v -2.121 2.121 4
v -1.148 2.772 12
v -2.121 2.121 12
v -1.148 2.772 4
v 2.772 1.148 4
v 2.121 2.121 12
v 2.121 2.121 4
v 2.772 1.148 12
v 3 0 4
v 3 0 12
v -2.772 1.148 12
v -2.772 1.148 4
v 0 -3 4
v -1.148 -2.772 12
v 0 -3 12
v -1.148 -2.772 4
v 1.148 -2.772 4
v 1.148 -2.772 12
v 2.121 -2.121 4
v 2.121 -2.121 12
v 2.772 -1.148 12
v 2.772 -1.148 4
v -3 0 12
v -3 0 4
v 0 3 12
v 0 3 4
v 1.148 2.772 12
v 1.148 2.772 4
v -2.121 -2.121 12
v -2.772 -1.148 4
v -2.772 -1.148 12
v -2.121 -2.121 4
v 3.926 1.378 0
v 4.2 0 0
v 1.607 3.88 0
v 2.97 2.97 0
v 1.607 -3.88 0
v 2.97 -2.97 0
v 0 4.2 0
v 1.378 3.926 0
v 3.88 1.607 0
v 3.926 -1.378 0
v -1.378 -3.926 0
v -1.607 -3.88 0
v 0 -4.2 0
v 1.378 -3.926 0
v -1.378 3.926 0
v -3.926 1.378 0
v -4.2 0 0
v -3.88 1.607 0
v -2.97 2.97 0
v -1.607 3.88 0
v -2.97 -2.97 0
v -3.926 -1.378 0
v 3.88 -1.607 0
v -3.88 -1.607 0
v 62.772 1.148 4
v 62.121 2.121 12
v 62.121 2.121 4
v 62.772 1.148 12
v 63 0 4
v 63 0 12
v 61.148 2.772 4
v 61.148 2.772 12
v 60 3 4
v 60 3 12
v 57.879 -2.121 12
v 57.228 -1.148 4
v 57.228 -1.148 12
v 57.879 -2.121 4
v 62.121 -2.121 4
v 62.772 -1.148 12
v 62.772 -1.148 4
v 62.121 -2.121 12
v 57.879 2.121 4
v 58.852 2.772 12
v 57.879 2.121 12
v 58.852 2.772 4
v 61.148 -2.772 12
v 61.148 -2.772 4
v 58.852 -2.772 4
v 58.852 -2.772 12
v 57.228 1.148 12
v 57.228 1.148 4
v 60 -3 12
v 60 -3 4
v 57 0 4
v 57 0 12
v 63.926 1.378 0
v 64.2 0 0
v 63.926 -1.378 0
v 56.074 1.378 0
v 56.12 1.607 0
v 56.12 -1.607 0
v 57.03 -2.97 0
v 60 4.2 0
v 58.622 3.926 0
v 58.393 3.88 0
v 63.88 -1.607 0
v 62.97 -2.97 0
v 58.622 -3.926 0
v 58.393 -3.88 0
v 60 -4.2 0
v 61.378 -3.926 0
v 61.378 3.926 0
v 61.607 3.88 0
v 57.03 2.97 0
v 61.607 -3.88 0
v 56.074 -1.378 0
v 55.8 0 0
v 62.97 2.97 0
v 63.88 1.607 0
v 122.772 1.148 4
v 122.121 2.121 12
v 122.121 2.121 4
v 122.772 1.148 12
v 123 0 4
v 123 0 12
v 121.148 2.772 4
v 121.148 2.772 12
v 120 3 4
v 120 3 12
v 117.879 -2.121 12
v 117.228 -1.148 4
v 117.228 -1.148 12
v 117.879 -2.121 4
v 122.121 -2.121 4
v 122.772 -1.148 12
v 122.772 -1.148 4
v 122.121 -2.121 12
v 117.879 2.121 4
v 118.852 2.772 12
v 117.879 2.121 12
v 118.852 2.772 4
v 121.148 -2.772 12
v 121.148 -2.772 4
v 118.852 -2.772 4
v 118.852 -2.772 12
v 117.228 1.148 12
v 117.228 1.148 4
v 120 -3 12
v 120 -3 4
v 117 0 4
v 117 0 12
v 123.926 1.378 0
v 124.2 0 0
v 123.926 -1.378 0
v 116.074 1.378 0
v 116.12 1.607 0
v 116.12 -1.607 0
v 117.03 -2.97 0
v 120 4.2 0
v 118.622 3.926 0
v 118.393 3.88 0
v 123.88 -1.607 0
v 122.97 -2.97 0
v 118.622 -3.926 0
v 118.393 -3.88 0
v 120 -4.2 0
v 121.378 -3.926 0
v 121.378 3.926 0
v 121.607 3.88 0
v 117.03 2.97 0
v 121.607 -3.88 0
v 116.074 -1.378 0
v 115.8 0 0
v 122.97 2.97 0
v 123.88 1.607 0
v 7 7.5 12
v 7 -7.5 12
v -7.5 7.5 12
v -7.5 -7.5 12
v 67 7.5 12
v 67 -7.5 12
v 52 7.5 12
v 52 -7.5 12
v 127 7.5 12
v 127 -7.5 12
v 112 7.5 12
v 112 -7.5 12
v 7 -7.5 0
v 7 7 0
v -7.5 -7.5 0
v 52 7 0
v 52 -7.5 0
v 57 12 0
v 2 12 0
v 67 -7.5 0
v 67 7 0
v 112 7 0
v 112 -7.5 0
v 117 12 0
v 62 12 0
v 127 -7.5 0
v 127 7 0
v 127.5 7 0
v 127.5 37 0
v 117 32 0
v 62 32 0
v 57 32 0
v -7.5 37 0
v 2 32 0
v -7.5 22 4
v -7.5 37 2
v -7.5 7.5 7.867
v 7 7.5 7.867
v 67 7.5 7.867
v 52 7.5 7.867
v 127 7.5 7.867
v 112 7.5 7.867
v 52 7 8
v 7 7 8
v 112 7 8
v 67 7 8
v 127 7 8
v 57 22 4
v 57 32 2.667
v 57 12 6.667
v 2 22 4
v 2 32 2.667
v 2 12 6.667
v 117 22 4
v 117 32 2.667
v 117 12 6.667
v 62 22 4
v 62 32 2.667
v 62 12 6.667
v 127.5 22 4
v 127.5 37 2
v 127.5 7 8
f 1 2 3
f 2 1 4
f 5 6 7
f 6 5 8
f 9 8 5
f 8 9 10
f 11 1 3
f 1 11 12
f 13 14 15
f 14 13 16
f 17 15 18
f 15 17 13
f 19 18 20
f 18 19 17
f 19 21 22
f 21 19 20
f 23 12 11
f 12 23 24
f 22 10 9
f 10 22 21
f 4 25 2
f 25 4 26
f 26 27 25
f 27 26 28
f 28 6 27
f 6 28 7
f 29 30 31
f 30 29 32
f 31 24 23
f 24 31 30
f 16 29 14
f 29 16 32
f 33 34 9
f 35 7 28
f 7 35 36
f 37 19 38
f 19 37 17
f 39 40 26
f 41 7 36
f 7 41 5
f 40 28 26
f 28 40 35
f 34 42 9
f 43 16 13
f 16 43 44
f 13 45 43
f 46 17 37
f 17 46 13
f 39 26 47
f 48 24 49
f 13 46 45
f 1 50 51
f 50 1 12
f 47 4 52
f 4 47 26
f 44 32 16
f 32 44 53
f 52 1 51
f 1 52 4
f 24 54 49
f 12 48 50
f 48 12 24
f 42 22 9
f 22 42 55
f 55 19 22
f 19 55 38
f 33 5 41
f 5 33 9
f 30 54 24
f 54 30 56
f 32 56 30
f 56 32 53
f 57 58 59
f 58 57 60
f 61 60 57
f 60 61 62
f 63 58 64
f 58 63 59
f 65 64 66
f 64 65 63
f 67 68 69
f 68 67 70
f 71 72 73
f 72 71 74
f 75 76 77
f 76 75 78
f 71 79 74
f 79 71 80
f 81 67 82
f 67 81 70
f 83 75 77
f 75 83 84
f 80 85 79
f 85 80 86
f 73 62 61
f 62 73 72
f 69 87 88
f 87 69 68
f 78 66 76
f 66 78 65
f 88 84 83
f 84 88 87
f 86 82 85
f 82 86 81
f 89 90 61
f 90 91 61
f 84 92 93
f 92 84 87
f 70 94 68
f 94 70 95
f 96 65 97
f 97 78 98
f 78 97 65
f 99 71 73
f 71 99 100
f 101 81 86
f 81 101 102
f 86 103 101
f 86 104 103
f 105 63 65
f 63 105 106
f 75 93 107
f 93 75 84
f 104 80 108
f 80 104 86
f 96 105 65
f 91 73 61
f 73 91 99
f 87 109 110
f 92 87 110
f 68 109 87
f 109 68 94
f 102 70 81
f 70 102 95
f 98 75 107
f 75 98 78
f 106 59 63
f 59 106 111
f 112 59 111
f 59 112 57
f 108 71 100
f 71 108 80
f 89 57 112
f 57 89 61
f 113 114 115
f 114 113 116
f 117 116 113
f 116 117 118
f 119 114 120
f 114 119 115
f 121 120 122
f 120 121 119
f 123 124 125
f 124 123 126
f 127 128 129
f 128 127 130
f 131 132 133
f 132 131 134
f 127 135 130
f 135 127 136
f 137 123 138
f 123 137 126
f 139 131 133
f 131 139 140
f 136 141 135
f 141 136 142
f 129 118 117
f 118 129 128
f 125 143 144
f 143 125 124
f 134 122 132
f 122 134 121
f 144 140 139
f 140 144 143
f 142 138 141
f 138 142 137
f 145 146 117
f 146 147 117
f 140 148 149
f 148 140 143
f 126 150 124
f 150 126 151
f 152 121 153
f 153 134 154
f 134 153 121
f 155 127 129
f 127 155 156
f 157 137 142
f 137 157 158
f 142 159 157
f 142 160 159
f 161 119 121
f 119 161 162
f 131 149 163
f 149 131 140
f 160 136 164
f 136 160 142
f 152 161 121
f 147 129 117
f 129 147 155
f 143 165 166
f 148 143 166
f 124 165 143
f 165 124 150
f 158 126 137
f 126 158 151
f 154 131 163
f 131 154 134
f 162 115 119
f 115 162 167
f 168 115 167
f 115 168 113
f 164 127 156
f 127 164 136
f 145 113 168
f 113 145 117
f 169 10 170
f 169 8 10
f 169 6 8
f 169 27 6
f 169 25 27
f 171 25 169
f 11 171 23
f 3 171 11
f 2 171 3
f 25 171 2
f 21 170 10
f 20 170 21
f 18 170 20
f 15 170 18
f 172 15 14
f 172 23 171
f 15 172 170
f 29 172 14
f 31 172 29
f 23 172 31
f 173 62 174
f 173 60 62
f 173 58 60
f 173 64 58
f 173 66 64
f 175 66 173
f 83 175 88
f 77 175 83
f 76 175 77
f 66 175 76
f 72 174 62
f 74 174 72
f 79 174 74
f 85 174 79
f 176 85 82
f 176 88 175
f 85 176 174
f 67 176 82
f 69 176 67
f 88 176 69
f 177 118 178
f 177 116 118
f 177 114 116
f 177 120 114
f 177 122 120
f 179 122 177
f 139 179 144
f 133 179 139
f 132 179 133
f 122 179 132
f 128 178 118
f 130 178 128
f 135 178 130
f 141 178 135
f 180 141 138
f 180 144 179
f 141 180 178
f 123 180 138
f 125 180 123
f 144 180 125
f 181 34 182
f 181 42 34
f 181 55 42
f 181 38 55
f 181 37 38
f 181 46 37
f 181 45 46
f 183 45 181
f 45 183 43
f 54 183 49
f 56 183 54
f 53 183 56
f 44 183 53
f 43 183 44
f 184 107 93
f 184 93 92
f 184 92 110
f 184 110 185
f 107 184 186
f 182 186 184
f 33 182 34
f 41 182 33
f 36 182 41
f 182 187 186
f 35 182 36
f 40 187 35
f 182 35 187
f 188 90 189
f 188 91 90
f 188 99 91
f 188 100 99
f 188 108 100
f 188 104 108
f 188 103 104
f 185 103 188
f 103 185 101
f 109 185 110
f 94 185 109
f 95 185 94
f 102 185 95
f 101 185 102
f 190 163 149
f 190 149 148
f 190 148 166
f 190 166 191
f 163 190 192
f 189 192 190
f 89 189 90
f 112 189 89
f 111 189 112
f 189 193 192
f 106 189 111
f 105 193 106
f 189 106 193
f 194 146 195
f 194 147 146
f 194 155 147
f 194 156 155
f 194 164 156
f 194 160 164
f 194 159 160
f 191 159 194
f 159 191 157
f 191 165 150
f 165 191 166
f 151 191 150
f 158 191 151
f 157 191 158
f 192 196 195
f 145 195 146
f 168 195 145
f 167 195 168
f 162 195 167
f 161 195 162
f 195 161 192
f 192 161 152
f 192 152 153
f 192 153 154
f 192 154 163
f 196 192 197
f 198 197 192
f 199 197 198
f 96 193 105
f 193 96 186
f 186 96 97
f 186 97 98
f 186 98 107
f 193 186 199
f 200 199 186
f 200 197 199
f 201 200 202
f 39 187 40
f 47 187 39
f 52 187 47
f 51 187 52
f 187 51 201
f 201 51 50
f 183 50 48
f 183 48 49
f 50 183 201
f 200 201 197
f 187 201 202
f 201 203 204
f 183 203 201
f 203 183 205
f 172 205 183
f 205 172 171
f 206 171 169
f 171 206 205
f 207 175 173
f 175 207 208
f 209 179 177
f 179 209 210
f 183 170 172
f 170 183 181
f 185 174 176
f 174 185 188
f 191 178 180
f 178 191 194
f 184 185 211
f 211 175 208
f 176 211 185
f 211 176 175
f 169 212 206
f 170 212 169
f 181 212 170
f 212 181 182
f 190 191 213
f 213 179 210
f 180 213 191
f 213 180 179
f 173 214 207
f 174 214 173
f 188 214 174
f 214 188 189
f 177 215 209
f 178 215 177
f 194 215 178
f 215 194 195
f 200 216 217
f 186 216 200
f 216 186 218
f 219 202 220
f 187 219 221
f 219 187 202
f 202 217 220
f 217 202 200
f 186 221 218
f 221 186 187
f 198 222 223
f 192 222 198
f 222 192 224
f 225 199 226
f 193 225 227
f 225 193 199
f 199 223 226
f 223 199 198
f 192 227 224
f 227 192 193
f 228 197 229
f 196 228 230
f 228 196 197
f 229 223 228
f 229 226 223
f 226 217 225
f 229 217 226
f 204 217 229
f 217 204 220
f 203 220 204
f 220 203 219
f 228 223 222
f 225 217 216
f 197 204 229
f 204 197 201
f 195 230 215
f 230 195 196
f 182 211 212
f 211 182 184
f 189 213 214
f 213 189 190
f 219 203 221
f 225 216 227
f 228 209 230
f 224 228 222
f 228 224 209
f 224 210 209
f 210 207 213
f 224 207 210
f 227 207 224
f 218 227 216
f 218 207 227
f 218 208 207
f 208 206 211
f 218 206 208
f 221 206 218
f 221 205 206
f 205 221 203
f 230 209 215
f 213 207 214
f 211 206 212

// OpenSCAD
// [FL_INDEX: keywords="openscad, 3d_parametric, Wine_Glass_Holder____OpenSCAD_Version, csg_solid" | COT="Parametric OpenSCAD design from 3DCodeverse"]
// Title: Wine Glass Holder, + OpenSCAD Version

assemble(segments=3,s_length=60,height=12,shifter_height=8,shifter_length=30,hole_diameter=3);

module assemble(segments,s_length,height,shifter_height,shifter_length,hole_diameter)
{  union()
    { fixpoints(segments,s_length,height,hole_diameter);
      difference()
      {translate([0,7.0,0])shifter_2(s_length*(segments-1)+15,shifter_length,shifter_height,2);
    union()
    { for (x = [0 :  (segments-2)])
        { translate([(s_length)*x+2,12,-1]) cube([s_length-5,shifter_length-10,20]);
		 }
	 }
  }  
  }
     
   
}

module shifter_2(length,width,height,shift)
{ translate([length-7.5,0,0]) rotate([0,-90,0]) linear_extrude(height = length,$fn=2) polygon( points=[[0,0],[0,width],[0+shift,width],[height/2,width/2],[height,0],[height,0]] );


}

module fixpoints(segments,s_length,height,hole_diameter)
{ difference()
  { difference()
    { translate([-7.5,-7.5,0]) cube([s_length*(segments)-15,15,height]);
	  
      union()
      { for (x = [0 :  segments])
        { sinkhole(x*s_length,0,hole_diameter,30,5);
          echo ("Segment ",x);
		 }
      }
    }
	union()
      { for (x = [0 :  segments])
        { translate([(s_length)*x+7,-8.5,-1]) cube([s_length-15,17,height+2]);
		 }
      }
    
  }
}


module sinkhole(x,y,diameter,height,sinkheight)
{ translate([x,y,-1])
  cylinder(h = height,r1=diameter, r2=diameter,center=false,$fn=16);
  translate([x,y,-1])
  cylinder(h = sinkheight,r1=diameter+diameter*0.5, r2=diameter,center=false,$fn=16);

}
